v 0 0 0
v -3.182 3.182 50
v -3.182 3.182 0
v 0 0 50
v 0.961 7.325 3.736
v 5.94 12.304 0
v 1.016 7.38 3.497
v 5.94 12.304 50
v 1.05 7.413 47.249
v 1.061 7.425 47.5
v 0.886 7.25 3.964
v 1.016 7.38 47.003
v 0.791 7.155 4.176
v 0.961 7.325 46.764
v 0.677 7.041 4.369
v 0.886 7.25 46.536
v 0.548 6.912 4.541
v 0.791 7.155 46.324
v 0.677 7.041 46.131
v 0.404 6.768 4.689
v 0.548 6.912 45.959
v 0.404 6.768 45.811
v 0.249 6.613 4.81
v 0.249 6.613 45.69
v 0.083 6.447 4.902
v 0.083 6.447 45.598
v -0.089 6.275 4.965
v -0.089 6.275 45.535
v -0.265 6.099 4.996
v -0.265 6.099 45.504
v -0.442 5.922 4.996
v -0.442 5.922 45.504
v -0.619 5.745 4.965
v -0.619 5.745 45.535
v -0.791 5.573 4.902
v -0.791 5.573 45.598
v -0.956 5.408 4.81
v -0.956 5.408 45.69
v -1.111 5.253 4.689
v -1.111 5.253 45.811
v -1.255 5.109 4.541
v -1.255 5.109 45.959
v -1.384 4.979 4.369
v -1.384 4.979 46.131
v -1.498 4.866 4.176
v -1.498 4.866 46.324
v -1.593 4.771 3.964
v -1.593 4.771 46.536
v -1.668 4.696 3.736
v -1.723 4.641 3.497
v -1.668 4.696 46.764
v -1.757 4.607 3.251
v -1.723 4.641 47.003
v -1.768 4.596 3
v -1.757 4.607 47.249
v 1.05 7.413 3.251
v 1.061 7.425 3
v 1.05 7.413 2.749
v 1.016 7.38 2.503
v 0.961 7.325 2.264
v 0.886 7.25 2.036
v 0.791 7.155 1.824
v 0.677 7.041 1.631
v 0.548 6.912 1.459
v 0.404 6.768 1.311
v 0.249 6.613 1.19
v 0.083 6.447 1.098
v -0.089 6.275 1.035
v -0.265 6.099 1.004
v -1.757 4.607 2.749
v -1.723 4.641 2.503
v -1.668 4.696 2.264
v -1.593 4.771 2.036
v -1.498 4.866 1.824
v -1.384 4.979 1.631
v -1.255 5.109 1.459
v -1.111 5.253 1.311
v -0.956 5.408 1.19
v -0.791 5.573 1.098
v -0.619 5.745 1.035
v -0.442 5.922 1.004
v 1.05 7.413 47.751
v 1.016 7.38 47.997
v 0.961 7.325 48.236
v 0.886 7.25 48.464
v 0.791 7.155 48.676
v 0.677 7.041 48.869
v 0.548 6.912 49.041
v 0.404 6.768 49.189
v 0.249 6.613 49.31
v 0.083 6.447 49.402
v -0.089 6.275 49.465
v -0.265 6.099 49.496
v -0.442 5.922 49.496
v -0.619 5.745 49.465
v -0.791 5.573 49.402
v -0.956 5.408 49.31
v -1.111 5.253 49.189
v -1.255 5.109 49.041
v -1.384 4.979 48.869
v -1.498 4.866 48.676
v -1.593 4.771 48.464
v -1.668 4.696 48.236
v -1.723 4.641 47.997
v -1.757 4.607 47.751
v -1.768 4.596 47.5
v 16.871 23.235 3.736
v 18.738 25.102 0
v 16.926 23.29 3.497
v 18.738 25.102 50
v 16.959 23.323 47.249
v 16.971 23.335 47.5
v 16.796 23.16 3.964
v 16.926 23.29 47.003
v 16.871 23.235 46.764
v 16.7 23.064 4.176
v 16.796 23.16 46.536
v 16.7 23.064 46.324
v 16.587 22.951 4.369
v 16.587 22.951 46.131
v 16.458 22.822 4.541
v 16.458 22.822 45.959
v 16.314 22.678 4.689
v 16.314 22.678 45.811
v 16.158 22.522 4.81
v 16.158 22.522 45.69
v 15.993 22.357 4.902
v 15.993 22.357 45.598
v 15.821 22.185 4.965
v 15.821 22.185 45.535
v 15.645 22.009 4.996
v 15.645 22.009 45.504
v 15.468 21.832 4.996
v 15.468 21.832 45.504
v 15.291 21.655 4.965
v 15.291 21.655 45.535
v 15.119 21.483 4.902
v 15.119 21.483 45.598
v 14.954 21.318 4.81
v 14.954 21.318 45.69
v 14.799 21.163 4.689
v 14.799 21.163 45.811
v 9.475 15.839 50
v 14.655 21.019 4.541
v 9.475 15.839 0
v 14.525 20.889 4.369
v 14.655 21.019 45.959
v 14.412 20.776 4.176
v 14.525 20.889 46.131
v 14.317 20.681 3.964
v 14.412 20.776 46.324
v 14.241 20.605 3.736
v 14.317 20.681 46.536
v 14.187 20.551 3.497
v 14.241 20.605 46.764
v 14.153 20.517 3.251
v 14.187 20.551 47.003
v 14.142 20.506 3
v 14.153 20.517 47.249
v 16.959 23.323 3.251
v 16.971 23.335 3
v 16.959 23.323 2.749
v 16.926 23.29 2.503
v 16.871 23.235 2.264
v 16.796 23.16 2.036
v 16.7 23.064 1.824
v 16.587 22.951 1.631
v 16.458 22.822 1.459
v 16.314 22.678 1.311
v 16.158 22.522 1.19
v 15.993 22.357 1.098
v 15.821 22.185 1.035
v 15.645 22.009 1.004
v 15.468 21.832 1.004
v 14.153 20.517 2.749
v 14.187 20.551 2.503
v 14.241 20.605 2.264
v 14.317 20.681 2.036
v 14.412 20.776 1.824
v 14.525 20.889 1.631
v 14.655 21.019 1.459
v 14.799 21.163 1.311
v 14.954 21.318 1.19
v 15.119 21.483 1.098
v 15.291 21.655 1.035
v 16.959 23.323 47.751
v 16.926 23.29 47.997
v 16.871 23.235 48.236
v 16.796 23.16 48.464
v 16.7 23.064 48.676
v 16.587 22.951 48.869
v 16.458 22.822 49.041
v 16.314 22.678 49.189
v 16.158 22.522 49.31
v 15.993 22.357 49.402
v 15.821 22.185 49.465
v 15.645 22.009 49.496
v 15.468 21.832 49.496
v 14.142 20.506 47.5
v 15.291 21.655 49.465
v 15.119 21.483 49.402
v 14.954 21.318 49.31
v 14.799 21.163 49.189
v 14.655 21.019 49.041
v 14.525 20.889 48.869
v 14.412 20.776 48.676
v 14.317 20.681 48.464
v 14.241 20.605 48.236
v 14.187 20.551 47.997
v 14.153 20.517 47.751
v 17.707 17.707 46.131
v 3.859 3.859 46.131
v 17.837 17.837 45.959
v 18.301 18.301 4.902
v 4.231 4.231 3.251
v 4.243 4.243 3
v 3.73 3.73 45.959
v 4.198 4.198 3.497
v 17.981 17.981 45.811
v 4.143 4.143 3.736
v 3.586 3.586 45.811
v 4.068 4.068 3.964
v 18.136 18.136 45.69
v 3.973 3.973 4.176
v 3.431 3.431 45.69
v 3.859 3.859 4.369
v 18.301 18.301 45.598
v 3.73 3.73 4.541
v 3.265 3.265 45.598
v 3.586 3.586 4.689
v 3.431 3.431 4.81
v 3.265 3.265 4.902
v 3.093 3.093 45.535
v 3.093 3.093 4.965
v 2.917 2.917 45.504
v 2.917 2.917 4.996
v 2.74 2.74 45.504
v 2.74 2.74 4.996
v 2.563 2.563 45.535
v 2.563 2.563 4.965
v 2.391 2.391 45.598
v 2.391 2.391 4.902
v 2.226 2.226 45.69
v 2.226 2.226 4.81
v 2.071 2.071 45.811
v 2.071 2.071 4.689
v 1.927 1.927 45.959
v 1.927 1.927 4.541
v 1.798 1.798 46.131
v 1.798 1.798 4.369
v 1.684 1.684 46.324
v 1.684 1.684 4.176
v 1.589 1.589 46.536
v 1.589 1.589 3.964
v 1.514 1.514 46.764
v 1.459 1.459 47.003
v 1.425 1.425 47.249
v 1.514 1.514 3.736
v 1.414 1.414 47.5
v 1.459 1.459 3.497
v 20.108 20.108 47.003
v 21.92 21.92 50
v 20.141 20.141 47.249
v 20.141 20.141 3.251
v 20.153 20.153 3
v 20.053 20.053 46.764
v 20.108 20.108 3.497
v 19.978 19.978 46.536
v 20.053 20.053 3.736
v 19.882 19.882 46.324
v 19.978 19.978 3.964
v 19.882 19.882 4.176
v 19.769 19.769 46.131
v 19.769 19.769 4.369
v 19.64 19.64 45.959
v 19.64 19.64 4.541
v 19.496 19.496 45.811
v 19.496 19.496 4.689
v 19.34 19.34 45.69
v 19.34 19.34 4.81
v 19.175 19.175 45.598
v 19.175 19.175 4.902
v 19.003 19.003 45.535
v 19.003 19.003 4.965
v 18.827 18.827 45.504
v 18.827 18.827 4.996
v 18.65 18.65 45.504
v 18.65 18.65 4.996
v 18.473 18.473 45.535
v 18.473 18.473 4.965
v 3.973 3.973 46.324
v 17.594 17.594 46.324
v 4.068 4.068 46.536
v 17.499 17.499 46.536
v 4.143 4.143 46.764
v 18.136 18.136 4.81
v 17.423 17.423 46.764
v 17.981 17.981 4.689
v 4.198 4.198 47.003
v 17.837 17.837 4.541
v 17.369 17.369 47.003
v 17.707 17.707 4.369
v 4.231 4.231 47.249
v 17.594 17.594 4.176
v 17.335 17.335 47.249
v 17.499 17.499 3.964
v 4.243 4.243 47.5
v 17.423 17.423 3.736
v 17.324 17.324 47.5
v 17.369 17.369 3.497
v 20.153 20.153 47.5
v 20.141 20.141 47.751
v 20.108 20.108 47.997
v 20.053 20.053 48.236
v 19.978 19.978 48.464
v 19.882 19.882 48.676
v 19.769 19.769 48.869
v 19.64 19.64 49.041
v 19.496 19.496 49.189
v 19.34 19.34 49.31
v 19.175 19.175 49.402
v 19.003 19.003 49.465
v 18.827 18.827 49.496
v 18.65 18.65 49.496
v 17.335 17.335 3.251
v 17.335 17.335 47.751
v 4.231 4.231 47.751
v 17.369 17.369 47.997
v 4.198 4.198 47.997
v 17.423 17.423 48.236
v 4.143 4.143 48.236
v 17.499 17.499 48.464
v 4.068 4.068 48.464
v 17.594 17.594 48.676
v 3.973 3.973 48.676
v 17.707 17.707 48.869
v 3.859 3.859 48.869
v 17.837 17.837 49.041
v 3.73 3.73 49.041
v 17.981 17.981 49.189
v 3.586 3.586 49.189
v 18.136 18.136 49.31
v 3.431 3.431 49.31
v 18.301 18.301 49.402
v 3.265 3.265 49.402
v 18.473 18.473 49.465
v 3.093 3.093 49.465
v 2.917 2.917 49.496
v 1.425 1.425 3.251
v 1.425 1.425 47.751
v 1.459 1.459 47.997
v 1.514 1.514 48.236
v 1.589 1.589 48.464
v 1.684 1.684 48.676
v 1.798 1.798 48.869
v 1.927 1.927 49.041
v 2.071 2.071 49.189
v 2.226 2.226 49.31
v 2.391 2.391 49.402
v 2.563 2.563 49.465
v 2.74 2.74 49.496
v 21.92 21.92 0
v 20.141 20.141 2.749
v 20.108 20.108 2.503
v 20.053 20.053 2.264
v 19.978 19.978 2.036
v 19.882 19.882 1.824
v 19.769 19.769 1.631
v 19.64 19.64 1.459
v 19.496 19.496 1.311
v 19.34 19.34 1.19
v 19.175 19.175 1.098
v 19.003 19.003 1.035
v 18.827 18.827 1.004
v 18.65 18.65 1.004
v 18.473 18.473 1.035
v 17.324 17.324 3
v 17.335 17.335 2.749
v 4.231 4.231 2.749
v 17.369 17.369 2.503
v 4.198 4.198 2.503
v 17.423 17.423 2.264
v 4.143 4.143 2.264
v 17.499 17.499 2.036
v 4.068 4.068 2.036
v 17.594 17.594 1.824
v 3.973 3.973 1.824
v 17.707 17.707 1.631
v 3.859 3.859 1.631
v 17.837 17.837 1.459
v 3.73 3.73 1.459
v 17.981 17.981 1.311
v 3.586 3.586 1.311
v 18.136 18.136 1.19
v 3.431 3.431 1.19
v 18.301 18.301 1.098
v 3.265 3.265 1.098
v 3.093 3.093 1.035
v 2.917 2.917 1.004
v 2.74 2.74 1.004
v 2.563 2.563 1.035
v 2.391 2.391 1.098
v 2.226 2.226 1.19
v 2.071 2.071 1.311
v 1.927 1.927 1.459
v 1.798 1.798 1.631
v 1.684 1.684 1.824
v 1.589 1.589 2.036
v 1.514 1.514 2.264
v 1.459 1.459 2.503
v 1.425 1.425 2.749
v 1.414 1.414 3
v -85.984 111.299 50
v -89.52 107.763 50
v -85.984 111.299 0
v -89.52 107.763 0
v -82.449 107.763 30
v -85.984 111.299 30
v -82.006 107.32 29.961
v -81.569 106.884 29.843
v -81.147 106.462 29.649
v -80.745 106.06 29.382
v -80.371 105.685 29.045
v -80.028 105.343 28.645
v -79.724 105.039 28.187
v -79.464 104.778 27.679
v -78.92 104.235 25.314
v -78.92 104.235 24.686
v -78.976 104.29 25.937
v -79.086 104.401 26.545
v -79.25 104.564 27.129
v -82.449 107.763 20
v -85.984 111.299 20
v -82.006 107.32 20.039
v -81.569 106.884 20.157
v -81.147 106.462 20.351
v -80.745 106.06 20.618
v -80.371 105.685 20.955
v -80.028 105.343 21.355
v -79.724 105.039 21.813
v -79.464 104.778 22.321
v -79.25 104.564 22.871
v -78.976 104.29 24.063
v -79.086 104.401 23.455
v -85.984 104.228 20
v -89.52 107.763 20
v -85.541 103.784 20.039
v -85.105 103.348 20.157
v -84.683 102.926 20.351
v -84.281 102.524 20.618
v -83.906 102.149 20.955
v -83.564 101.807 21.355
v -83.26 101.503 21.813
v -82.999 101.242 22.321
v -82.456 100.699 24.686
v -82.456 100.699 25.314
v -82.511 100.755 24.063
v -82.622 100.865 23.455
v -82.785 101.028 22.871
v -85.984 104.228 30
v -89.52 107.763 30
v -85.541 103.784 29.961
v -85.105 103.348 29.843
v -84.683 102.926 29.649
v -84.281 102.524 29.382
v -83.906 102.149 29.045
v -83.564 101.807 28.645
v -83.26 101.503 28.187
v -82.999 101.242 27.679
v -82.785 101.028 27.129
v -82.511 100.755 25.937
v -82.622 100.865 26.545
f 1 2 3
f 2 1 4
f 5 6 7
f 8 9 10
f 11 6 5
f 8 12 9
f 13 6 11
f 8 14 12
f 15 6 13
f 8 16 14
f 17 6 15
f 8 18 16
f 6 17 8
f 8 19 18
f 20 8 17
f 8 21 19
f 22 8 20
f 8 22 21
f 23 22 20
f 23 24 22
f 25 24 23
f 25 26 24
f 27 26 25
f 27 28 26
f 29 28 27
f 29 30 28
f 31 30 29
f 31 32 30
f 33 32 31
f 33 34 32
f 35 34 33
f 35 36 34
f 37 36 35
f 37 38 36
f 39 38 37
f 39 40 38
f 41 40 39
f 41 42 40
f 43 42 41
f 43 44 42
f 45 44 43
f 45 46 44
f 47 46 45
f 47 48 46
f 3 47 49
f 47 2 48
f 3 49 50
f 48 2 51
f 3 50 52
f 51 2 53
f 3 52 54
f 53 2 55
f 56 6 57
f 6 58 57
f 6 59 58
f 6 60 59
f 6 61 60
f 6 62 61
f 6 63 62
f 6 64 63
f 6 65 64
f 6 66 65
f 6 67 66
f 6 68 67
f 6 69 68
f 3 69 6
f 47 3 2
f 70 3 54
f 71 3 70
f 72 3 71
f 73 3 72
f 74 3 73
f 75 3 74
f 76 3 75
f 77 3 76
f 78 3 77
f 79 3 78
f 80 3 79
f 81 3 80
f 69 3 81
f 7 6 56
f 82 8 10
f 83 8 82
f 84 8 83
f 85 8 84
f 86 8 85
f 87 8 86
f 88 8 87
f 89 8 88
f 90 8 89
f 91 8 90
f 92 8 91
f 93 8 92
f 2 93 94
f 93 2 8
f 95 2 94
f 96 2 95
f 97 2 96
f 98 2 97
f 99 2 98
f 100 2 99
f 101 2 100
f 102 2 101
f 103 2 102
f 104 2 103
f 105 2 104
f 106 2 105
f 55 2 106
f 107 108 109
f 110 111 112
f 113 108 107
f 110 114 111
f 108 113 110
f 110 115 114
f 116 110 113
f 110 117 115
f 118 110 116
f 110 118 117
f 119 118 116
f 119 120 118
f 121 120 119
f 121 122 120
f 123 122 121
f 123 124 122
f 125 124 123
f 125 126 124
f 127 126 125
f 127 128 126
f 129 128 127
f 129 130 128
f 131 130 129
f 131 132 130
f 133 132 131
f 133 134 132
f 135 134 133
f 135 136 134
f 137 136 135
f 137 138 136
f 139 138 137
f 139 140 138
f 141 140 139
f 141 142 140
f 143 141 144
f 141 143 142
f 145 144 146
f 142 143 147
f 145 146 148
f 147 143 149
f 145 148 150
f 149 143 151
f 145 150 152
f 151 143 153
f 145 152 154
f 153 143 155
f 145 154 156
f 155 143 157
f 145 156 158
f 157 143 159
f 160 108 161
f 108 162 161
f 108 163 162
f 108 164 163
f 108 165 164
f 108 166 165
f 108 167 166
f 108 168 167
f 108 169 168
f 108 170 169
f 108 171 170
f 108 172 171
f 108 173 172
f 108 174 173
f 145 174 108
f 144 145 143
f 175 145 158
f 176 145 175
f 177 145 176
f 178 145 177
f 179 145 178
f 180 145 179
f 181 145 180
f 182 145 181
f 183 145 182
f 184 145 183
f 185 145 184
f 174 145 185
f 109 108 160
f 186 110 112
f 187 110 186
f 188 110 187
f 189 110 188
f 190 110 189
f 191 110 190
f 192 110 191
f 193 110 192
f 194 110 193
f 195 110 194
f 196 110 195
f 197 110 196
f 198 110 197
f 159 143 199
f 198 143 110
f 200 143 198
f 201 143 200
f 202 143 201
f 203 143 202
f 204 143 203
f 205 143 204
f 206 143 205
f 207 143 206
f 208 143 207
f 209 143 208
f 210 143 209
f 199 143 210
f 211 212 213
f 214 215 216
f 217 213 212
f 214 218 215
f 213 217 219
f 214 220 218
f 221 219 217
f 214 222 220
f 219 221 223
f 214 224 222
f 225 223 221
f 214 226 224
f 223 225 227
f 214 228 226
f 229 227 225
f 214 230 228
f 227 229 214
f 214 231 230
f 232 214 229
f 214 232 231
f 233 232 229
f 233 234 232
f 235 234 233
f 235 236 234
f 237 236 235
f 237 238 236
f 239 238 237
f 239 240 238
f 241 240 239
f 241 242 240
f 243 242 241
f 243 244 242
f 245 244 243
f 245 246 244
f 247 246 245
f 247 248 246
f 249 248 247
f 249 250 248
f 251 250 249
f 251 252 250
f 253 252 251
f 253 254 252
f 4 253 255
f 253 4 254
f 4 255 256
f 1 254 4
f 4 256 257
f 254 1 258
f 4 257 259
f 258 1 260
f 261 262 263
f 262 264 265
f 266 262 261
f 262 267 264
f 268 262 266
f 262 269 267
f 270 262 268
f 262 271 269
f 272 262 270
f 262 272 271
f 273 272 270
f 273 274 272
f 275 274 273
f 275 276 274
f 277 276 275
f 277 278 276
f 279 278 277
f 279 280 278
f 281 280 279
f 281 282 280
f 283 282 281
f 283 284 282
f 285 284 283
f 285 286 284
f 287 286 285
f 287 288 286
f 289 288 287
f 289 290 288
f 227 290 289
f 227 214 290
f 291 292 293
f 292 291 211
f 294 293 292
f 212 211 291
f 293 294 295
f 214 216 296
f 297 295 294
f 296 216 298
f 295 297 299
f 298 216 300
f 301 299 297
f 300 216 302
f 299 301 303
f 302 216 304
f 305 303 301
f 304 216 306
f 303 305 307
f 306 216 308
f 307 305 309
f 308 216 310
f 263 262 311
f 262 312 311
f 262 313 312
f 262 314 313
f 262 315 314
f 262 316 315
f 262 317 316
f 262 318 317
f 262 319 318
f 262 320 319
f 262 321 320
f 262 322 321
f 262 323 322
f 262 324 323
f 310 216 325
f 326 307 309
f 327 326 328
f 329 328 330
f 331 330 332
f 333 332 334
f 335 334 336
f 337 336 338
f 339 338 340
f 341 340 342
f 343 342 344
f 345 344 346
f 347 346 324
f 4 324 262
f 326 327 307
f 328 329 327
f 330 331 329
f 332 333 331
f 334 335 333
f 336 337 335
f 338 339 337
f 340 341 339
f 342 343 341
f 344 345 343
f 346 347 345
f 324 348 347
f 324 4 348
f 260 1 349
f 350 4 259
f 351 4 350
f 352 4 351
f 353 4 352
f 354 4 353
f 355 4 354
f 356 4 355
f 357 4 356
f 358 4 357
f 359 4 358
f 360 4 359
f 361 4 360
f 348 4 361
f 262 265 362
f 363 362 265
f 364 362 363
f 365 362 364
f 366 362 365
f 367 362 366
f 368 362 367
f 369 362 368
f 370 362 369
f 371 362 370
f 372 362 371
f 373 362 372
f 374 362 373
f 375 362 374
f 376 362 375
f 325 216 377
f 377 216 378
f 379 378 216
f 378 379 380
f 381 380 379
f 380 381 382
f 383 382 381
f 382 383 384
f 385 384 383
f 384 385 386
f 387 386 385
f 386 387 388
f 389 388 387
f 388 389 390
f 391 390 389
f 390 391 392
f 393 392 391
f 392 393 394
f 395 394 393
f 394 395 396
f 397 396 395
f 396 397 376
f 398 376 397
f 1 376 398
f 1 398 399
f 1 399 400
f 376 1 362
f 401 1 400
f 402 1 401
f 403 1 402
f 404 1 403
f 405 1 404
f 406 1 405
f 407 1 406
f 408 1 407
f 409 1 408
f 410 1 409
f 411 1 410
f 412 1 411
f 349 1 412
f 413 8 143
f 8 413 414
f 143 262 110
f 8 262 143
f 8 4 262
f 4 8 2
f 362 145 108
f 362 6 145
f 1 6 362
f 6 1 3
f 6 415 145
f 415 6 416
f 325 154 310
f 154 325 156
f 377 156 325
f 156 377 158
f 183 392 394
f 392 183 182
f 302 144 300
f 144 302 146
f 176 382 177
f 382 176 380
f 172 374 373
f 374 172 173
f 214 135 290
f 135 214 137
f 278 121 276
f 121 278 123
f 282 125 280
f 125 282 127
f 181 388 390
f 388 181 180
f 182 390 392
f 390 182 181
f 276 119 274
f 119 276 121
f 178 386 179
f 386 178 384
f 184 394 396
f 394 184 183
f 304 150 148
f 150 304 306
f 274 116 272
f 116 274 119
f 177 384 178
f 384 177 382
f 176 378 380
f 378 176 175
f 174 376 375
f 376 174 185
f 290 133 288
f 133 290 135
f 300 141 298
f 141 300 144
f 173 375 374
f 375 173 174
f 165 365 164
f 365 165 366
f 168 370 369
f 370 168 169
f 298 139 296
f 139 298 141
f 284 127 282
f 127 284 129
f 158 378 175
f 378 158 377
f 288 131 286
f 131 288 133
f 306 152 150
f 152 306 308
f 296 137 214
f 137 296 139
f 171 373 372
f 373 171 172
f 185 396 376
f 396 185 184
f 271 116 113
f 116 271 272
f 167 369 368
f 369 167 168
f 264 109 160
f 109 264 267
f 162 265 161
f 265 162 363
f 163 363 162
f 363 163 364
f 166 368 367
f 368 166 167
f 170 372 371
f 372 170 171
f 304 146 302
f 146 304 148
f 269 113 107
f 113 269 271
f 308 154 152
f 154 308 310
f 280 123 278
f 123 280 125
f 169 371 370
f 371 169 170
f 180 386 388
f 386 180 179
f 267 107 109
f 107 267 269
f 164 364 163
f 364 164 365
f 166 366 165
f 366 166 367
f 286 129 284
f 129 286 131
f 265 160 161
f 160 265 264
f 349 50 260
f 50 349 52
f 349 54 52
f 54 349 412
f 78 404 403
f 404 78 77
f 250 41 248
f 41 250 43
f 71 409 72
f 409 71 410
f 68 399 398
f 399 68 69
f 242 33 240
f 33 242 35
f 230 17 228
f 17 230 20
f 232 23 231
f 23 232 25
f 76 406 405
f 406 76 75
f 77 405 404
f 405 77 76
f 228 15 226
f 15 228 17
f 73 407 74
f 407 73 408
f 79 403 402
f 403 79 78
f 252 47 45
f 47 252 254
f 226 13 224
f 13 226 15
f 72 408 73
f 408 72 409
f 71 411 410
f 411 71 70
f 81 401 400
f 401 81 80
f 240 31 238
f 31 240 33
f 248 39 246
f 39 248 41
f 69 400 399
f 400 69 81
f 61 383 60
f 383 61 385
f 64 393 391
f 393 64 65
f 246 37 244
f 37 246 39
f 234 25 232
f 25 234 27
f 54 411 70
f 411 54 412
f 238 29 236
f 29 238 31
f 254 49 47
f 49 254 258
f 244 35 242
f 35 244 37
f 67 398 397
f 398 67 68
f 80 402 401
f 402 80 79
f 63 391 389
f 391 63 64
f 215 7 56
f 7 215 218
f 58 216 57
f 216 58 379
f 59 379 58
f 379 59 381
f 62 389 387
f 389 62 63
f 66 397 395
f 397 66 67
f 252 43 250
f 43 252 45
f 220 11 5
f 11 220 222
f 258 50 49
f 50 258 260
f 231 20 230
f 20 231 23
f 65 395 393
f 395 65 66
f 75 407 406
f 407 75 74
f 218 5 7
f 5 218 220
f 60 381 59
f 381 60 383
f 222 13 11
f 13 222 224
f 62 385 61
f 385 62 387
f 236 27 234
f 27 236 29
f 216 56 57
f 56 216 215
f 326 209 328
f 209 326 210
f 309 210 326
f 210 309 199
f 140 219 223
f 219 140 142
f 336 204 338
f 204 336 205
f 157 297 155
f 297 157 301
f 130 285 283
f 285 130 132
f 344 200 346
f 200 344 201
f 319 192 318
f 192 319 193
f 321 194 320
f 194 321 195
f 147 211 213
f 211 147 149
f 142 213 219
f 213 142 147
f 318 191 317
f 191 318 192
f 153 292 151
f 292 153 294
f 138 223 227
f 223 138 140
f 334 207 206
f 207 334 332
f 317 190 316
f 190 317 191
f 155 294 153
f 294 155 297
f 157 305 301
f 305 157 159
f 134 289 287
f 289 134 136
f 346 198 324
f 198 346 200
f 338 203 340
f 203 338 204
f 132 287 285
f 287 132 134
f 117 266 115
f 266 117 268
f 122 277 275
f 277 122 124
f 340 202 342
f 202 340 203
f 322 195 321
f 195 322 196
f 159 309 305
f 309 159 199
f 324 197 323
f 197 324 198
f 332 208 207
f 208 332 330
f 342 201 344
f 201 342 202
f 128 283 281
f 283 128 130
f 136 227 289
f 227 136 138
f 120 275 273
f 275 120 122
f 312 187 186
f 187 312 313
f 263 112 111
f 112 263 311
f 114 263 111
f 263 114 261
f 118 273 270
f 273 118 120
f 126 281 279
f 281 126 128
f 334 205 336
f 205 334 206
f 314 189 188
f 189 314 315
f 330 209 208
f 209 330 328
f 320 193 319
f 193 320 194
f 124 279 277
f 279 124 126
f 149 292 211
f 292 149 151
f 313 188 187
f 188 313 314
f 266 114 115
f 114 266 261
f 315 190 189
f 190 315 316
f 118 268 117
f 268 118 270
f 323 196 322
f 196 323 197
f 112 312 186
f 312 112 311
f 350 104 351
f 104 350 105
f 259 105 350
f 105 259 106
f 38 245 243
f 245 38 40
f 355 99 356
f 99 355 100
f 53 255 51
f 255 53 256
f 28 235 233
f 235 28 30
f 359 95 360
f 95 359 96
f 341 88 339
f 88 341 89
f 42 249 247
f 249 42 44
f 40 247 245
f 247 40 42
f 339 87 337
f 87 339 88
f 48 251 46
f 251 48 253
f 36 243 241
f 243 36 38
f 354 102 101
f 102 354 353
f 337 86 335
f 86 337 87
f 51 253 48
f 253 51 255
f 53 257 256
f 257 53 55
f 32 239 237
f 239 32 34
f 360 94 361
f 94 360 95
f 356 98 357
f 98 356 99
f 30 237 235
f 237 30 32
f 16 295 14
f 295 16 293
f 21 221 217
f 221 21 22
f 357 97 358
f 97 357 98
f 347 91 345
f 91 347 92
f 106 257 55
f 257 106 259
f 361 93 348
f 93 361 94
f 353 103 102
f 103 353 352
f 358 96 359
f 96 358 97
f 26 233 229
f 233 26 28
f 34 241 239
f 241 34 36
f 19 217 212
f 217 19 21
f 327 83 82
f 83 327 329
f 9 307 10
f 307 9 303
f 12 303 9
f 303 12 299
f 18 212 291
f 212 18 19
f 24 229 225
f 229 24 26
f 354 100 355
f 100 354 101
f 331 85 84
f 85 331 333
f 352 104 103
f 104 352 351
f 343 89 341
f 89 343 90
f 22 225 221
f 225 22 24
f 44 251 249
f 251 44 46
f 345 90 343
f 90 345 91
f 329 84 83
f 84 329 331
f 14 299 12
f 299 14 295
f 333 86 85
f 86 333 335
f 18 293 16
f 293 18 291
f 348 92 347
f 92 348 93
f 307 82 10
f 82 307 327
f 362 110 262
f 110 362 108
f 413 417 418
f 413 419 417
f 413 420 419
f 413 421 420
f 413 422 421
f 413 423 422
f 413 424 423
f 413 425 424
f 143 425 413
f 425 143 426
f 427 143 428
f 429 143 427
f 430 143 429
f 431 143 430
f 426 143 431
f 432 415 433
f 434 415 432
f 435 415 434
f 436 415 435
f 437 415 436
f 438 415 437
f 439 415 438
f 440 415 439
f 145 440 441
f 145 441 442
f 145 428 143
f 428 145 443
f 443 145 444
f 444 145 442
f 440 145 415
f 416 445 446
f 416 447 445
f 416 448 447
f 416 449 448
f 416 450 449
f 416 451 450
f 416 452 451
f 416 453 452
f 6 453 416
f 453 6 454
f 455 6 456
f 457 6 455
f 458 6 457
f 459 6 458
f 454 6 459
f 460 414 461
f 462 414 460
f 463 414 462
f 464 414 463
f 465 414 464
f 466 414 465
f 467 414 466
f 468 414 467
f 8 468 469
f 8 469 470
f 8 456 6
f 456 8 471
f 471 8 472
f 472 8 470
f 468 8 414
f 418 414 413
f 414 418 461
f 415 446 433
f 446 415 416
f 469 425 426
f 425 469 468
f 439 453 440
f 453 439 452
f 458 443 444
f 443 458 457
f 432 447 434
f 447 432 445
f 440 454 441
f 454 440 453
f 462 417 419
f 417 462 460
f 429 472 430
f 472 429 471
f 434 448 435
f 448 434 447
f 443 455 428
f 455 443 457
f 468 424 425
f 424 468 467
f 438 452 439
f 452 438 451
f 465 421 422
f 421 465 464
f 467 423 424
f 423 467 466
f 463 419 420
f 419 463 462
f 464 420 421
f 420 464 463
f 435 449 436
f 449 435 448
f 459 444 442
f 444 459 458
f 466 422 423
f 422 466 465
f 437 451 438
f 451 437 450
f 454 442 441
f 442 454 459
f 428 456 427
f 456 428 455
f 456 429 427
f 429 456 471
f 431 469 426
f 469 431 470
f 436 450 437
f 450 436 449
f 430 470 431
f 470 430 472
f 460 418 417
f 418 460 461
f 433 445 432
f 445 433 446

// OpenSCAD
 
bottomThick = 4.5;
height=135;
thick=5;
holeDiameter=10;

module bottomplate(bottomThick) {
    translate([54,0,0]) {
        rotate([90,0,180]) {
            difference() {
                cube([54,50,bottomThick]);
                translate([5,3,-1]) {
                    cylinder(r=4/2, h=bottomThick+2, $fn=50);
                }
                translate([27.5,3,-1]) {
                    cylinder(r=4/2, h=bottomThick+2, $fn=50);
                }
                translate([50,3,-1]) {
                    cylinder(r=4/2, h=bottomThick+2, $fn=50);
                }
                translate([27.5,47.5,-1]) {
                    cylinder(r=4/2, h=bottomThick+2, $fn=50);
                }
                translate([50,47.5,-1]) {
                    cylinder(r=4/2, h=bottomThick+2, $fn=50);
                }
            }
        }
    }
}

rotate([0,0,45]) {
    difference() {
        bottomplate(bottomThick=bottomThick);
        translate([31,-1,-1]) {
            cube([56,bottomThick+2,52]);
        }
    }
    translate([12.9-(thick-5)/2,0,0]) {
        difference() {
            cube([thick, height+bottomThick,50]);
            translate([-1,height+bottomThick-5,50/2]) {
                rotate([0,90,0]) {
                    cylinder(r=(holeDiameter/2), h=thick+2, $fn=50);
                }
            }
            translate([-1,height+bottomThick-5,50/2-holeDiameter/2]) {
                cube([thick+2, holeDiameter, holeDiameter]);
            }
        }
    }
}
